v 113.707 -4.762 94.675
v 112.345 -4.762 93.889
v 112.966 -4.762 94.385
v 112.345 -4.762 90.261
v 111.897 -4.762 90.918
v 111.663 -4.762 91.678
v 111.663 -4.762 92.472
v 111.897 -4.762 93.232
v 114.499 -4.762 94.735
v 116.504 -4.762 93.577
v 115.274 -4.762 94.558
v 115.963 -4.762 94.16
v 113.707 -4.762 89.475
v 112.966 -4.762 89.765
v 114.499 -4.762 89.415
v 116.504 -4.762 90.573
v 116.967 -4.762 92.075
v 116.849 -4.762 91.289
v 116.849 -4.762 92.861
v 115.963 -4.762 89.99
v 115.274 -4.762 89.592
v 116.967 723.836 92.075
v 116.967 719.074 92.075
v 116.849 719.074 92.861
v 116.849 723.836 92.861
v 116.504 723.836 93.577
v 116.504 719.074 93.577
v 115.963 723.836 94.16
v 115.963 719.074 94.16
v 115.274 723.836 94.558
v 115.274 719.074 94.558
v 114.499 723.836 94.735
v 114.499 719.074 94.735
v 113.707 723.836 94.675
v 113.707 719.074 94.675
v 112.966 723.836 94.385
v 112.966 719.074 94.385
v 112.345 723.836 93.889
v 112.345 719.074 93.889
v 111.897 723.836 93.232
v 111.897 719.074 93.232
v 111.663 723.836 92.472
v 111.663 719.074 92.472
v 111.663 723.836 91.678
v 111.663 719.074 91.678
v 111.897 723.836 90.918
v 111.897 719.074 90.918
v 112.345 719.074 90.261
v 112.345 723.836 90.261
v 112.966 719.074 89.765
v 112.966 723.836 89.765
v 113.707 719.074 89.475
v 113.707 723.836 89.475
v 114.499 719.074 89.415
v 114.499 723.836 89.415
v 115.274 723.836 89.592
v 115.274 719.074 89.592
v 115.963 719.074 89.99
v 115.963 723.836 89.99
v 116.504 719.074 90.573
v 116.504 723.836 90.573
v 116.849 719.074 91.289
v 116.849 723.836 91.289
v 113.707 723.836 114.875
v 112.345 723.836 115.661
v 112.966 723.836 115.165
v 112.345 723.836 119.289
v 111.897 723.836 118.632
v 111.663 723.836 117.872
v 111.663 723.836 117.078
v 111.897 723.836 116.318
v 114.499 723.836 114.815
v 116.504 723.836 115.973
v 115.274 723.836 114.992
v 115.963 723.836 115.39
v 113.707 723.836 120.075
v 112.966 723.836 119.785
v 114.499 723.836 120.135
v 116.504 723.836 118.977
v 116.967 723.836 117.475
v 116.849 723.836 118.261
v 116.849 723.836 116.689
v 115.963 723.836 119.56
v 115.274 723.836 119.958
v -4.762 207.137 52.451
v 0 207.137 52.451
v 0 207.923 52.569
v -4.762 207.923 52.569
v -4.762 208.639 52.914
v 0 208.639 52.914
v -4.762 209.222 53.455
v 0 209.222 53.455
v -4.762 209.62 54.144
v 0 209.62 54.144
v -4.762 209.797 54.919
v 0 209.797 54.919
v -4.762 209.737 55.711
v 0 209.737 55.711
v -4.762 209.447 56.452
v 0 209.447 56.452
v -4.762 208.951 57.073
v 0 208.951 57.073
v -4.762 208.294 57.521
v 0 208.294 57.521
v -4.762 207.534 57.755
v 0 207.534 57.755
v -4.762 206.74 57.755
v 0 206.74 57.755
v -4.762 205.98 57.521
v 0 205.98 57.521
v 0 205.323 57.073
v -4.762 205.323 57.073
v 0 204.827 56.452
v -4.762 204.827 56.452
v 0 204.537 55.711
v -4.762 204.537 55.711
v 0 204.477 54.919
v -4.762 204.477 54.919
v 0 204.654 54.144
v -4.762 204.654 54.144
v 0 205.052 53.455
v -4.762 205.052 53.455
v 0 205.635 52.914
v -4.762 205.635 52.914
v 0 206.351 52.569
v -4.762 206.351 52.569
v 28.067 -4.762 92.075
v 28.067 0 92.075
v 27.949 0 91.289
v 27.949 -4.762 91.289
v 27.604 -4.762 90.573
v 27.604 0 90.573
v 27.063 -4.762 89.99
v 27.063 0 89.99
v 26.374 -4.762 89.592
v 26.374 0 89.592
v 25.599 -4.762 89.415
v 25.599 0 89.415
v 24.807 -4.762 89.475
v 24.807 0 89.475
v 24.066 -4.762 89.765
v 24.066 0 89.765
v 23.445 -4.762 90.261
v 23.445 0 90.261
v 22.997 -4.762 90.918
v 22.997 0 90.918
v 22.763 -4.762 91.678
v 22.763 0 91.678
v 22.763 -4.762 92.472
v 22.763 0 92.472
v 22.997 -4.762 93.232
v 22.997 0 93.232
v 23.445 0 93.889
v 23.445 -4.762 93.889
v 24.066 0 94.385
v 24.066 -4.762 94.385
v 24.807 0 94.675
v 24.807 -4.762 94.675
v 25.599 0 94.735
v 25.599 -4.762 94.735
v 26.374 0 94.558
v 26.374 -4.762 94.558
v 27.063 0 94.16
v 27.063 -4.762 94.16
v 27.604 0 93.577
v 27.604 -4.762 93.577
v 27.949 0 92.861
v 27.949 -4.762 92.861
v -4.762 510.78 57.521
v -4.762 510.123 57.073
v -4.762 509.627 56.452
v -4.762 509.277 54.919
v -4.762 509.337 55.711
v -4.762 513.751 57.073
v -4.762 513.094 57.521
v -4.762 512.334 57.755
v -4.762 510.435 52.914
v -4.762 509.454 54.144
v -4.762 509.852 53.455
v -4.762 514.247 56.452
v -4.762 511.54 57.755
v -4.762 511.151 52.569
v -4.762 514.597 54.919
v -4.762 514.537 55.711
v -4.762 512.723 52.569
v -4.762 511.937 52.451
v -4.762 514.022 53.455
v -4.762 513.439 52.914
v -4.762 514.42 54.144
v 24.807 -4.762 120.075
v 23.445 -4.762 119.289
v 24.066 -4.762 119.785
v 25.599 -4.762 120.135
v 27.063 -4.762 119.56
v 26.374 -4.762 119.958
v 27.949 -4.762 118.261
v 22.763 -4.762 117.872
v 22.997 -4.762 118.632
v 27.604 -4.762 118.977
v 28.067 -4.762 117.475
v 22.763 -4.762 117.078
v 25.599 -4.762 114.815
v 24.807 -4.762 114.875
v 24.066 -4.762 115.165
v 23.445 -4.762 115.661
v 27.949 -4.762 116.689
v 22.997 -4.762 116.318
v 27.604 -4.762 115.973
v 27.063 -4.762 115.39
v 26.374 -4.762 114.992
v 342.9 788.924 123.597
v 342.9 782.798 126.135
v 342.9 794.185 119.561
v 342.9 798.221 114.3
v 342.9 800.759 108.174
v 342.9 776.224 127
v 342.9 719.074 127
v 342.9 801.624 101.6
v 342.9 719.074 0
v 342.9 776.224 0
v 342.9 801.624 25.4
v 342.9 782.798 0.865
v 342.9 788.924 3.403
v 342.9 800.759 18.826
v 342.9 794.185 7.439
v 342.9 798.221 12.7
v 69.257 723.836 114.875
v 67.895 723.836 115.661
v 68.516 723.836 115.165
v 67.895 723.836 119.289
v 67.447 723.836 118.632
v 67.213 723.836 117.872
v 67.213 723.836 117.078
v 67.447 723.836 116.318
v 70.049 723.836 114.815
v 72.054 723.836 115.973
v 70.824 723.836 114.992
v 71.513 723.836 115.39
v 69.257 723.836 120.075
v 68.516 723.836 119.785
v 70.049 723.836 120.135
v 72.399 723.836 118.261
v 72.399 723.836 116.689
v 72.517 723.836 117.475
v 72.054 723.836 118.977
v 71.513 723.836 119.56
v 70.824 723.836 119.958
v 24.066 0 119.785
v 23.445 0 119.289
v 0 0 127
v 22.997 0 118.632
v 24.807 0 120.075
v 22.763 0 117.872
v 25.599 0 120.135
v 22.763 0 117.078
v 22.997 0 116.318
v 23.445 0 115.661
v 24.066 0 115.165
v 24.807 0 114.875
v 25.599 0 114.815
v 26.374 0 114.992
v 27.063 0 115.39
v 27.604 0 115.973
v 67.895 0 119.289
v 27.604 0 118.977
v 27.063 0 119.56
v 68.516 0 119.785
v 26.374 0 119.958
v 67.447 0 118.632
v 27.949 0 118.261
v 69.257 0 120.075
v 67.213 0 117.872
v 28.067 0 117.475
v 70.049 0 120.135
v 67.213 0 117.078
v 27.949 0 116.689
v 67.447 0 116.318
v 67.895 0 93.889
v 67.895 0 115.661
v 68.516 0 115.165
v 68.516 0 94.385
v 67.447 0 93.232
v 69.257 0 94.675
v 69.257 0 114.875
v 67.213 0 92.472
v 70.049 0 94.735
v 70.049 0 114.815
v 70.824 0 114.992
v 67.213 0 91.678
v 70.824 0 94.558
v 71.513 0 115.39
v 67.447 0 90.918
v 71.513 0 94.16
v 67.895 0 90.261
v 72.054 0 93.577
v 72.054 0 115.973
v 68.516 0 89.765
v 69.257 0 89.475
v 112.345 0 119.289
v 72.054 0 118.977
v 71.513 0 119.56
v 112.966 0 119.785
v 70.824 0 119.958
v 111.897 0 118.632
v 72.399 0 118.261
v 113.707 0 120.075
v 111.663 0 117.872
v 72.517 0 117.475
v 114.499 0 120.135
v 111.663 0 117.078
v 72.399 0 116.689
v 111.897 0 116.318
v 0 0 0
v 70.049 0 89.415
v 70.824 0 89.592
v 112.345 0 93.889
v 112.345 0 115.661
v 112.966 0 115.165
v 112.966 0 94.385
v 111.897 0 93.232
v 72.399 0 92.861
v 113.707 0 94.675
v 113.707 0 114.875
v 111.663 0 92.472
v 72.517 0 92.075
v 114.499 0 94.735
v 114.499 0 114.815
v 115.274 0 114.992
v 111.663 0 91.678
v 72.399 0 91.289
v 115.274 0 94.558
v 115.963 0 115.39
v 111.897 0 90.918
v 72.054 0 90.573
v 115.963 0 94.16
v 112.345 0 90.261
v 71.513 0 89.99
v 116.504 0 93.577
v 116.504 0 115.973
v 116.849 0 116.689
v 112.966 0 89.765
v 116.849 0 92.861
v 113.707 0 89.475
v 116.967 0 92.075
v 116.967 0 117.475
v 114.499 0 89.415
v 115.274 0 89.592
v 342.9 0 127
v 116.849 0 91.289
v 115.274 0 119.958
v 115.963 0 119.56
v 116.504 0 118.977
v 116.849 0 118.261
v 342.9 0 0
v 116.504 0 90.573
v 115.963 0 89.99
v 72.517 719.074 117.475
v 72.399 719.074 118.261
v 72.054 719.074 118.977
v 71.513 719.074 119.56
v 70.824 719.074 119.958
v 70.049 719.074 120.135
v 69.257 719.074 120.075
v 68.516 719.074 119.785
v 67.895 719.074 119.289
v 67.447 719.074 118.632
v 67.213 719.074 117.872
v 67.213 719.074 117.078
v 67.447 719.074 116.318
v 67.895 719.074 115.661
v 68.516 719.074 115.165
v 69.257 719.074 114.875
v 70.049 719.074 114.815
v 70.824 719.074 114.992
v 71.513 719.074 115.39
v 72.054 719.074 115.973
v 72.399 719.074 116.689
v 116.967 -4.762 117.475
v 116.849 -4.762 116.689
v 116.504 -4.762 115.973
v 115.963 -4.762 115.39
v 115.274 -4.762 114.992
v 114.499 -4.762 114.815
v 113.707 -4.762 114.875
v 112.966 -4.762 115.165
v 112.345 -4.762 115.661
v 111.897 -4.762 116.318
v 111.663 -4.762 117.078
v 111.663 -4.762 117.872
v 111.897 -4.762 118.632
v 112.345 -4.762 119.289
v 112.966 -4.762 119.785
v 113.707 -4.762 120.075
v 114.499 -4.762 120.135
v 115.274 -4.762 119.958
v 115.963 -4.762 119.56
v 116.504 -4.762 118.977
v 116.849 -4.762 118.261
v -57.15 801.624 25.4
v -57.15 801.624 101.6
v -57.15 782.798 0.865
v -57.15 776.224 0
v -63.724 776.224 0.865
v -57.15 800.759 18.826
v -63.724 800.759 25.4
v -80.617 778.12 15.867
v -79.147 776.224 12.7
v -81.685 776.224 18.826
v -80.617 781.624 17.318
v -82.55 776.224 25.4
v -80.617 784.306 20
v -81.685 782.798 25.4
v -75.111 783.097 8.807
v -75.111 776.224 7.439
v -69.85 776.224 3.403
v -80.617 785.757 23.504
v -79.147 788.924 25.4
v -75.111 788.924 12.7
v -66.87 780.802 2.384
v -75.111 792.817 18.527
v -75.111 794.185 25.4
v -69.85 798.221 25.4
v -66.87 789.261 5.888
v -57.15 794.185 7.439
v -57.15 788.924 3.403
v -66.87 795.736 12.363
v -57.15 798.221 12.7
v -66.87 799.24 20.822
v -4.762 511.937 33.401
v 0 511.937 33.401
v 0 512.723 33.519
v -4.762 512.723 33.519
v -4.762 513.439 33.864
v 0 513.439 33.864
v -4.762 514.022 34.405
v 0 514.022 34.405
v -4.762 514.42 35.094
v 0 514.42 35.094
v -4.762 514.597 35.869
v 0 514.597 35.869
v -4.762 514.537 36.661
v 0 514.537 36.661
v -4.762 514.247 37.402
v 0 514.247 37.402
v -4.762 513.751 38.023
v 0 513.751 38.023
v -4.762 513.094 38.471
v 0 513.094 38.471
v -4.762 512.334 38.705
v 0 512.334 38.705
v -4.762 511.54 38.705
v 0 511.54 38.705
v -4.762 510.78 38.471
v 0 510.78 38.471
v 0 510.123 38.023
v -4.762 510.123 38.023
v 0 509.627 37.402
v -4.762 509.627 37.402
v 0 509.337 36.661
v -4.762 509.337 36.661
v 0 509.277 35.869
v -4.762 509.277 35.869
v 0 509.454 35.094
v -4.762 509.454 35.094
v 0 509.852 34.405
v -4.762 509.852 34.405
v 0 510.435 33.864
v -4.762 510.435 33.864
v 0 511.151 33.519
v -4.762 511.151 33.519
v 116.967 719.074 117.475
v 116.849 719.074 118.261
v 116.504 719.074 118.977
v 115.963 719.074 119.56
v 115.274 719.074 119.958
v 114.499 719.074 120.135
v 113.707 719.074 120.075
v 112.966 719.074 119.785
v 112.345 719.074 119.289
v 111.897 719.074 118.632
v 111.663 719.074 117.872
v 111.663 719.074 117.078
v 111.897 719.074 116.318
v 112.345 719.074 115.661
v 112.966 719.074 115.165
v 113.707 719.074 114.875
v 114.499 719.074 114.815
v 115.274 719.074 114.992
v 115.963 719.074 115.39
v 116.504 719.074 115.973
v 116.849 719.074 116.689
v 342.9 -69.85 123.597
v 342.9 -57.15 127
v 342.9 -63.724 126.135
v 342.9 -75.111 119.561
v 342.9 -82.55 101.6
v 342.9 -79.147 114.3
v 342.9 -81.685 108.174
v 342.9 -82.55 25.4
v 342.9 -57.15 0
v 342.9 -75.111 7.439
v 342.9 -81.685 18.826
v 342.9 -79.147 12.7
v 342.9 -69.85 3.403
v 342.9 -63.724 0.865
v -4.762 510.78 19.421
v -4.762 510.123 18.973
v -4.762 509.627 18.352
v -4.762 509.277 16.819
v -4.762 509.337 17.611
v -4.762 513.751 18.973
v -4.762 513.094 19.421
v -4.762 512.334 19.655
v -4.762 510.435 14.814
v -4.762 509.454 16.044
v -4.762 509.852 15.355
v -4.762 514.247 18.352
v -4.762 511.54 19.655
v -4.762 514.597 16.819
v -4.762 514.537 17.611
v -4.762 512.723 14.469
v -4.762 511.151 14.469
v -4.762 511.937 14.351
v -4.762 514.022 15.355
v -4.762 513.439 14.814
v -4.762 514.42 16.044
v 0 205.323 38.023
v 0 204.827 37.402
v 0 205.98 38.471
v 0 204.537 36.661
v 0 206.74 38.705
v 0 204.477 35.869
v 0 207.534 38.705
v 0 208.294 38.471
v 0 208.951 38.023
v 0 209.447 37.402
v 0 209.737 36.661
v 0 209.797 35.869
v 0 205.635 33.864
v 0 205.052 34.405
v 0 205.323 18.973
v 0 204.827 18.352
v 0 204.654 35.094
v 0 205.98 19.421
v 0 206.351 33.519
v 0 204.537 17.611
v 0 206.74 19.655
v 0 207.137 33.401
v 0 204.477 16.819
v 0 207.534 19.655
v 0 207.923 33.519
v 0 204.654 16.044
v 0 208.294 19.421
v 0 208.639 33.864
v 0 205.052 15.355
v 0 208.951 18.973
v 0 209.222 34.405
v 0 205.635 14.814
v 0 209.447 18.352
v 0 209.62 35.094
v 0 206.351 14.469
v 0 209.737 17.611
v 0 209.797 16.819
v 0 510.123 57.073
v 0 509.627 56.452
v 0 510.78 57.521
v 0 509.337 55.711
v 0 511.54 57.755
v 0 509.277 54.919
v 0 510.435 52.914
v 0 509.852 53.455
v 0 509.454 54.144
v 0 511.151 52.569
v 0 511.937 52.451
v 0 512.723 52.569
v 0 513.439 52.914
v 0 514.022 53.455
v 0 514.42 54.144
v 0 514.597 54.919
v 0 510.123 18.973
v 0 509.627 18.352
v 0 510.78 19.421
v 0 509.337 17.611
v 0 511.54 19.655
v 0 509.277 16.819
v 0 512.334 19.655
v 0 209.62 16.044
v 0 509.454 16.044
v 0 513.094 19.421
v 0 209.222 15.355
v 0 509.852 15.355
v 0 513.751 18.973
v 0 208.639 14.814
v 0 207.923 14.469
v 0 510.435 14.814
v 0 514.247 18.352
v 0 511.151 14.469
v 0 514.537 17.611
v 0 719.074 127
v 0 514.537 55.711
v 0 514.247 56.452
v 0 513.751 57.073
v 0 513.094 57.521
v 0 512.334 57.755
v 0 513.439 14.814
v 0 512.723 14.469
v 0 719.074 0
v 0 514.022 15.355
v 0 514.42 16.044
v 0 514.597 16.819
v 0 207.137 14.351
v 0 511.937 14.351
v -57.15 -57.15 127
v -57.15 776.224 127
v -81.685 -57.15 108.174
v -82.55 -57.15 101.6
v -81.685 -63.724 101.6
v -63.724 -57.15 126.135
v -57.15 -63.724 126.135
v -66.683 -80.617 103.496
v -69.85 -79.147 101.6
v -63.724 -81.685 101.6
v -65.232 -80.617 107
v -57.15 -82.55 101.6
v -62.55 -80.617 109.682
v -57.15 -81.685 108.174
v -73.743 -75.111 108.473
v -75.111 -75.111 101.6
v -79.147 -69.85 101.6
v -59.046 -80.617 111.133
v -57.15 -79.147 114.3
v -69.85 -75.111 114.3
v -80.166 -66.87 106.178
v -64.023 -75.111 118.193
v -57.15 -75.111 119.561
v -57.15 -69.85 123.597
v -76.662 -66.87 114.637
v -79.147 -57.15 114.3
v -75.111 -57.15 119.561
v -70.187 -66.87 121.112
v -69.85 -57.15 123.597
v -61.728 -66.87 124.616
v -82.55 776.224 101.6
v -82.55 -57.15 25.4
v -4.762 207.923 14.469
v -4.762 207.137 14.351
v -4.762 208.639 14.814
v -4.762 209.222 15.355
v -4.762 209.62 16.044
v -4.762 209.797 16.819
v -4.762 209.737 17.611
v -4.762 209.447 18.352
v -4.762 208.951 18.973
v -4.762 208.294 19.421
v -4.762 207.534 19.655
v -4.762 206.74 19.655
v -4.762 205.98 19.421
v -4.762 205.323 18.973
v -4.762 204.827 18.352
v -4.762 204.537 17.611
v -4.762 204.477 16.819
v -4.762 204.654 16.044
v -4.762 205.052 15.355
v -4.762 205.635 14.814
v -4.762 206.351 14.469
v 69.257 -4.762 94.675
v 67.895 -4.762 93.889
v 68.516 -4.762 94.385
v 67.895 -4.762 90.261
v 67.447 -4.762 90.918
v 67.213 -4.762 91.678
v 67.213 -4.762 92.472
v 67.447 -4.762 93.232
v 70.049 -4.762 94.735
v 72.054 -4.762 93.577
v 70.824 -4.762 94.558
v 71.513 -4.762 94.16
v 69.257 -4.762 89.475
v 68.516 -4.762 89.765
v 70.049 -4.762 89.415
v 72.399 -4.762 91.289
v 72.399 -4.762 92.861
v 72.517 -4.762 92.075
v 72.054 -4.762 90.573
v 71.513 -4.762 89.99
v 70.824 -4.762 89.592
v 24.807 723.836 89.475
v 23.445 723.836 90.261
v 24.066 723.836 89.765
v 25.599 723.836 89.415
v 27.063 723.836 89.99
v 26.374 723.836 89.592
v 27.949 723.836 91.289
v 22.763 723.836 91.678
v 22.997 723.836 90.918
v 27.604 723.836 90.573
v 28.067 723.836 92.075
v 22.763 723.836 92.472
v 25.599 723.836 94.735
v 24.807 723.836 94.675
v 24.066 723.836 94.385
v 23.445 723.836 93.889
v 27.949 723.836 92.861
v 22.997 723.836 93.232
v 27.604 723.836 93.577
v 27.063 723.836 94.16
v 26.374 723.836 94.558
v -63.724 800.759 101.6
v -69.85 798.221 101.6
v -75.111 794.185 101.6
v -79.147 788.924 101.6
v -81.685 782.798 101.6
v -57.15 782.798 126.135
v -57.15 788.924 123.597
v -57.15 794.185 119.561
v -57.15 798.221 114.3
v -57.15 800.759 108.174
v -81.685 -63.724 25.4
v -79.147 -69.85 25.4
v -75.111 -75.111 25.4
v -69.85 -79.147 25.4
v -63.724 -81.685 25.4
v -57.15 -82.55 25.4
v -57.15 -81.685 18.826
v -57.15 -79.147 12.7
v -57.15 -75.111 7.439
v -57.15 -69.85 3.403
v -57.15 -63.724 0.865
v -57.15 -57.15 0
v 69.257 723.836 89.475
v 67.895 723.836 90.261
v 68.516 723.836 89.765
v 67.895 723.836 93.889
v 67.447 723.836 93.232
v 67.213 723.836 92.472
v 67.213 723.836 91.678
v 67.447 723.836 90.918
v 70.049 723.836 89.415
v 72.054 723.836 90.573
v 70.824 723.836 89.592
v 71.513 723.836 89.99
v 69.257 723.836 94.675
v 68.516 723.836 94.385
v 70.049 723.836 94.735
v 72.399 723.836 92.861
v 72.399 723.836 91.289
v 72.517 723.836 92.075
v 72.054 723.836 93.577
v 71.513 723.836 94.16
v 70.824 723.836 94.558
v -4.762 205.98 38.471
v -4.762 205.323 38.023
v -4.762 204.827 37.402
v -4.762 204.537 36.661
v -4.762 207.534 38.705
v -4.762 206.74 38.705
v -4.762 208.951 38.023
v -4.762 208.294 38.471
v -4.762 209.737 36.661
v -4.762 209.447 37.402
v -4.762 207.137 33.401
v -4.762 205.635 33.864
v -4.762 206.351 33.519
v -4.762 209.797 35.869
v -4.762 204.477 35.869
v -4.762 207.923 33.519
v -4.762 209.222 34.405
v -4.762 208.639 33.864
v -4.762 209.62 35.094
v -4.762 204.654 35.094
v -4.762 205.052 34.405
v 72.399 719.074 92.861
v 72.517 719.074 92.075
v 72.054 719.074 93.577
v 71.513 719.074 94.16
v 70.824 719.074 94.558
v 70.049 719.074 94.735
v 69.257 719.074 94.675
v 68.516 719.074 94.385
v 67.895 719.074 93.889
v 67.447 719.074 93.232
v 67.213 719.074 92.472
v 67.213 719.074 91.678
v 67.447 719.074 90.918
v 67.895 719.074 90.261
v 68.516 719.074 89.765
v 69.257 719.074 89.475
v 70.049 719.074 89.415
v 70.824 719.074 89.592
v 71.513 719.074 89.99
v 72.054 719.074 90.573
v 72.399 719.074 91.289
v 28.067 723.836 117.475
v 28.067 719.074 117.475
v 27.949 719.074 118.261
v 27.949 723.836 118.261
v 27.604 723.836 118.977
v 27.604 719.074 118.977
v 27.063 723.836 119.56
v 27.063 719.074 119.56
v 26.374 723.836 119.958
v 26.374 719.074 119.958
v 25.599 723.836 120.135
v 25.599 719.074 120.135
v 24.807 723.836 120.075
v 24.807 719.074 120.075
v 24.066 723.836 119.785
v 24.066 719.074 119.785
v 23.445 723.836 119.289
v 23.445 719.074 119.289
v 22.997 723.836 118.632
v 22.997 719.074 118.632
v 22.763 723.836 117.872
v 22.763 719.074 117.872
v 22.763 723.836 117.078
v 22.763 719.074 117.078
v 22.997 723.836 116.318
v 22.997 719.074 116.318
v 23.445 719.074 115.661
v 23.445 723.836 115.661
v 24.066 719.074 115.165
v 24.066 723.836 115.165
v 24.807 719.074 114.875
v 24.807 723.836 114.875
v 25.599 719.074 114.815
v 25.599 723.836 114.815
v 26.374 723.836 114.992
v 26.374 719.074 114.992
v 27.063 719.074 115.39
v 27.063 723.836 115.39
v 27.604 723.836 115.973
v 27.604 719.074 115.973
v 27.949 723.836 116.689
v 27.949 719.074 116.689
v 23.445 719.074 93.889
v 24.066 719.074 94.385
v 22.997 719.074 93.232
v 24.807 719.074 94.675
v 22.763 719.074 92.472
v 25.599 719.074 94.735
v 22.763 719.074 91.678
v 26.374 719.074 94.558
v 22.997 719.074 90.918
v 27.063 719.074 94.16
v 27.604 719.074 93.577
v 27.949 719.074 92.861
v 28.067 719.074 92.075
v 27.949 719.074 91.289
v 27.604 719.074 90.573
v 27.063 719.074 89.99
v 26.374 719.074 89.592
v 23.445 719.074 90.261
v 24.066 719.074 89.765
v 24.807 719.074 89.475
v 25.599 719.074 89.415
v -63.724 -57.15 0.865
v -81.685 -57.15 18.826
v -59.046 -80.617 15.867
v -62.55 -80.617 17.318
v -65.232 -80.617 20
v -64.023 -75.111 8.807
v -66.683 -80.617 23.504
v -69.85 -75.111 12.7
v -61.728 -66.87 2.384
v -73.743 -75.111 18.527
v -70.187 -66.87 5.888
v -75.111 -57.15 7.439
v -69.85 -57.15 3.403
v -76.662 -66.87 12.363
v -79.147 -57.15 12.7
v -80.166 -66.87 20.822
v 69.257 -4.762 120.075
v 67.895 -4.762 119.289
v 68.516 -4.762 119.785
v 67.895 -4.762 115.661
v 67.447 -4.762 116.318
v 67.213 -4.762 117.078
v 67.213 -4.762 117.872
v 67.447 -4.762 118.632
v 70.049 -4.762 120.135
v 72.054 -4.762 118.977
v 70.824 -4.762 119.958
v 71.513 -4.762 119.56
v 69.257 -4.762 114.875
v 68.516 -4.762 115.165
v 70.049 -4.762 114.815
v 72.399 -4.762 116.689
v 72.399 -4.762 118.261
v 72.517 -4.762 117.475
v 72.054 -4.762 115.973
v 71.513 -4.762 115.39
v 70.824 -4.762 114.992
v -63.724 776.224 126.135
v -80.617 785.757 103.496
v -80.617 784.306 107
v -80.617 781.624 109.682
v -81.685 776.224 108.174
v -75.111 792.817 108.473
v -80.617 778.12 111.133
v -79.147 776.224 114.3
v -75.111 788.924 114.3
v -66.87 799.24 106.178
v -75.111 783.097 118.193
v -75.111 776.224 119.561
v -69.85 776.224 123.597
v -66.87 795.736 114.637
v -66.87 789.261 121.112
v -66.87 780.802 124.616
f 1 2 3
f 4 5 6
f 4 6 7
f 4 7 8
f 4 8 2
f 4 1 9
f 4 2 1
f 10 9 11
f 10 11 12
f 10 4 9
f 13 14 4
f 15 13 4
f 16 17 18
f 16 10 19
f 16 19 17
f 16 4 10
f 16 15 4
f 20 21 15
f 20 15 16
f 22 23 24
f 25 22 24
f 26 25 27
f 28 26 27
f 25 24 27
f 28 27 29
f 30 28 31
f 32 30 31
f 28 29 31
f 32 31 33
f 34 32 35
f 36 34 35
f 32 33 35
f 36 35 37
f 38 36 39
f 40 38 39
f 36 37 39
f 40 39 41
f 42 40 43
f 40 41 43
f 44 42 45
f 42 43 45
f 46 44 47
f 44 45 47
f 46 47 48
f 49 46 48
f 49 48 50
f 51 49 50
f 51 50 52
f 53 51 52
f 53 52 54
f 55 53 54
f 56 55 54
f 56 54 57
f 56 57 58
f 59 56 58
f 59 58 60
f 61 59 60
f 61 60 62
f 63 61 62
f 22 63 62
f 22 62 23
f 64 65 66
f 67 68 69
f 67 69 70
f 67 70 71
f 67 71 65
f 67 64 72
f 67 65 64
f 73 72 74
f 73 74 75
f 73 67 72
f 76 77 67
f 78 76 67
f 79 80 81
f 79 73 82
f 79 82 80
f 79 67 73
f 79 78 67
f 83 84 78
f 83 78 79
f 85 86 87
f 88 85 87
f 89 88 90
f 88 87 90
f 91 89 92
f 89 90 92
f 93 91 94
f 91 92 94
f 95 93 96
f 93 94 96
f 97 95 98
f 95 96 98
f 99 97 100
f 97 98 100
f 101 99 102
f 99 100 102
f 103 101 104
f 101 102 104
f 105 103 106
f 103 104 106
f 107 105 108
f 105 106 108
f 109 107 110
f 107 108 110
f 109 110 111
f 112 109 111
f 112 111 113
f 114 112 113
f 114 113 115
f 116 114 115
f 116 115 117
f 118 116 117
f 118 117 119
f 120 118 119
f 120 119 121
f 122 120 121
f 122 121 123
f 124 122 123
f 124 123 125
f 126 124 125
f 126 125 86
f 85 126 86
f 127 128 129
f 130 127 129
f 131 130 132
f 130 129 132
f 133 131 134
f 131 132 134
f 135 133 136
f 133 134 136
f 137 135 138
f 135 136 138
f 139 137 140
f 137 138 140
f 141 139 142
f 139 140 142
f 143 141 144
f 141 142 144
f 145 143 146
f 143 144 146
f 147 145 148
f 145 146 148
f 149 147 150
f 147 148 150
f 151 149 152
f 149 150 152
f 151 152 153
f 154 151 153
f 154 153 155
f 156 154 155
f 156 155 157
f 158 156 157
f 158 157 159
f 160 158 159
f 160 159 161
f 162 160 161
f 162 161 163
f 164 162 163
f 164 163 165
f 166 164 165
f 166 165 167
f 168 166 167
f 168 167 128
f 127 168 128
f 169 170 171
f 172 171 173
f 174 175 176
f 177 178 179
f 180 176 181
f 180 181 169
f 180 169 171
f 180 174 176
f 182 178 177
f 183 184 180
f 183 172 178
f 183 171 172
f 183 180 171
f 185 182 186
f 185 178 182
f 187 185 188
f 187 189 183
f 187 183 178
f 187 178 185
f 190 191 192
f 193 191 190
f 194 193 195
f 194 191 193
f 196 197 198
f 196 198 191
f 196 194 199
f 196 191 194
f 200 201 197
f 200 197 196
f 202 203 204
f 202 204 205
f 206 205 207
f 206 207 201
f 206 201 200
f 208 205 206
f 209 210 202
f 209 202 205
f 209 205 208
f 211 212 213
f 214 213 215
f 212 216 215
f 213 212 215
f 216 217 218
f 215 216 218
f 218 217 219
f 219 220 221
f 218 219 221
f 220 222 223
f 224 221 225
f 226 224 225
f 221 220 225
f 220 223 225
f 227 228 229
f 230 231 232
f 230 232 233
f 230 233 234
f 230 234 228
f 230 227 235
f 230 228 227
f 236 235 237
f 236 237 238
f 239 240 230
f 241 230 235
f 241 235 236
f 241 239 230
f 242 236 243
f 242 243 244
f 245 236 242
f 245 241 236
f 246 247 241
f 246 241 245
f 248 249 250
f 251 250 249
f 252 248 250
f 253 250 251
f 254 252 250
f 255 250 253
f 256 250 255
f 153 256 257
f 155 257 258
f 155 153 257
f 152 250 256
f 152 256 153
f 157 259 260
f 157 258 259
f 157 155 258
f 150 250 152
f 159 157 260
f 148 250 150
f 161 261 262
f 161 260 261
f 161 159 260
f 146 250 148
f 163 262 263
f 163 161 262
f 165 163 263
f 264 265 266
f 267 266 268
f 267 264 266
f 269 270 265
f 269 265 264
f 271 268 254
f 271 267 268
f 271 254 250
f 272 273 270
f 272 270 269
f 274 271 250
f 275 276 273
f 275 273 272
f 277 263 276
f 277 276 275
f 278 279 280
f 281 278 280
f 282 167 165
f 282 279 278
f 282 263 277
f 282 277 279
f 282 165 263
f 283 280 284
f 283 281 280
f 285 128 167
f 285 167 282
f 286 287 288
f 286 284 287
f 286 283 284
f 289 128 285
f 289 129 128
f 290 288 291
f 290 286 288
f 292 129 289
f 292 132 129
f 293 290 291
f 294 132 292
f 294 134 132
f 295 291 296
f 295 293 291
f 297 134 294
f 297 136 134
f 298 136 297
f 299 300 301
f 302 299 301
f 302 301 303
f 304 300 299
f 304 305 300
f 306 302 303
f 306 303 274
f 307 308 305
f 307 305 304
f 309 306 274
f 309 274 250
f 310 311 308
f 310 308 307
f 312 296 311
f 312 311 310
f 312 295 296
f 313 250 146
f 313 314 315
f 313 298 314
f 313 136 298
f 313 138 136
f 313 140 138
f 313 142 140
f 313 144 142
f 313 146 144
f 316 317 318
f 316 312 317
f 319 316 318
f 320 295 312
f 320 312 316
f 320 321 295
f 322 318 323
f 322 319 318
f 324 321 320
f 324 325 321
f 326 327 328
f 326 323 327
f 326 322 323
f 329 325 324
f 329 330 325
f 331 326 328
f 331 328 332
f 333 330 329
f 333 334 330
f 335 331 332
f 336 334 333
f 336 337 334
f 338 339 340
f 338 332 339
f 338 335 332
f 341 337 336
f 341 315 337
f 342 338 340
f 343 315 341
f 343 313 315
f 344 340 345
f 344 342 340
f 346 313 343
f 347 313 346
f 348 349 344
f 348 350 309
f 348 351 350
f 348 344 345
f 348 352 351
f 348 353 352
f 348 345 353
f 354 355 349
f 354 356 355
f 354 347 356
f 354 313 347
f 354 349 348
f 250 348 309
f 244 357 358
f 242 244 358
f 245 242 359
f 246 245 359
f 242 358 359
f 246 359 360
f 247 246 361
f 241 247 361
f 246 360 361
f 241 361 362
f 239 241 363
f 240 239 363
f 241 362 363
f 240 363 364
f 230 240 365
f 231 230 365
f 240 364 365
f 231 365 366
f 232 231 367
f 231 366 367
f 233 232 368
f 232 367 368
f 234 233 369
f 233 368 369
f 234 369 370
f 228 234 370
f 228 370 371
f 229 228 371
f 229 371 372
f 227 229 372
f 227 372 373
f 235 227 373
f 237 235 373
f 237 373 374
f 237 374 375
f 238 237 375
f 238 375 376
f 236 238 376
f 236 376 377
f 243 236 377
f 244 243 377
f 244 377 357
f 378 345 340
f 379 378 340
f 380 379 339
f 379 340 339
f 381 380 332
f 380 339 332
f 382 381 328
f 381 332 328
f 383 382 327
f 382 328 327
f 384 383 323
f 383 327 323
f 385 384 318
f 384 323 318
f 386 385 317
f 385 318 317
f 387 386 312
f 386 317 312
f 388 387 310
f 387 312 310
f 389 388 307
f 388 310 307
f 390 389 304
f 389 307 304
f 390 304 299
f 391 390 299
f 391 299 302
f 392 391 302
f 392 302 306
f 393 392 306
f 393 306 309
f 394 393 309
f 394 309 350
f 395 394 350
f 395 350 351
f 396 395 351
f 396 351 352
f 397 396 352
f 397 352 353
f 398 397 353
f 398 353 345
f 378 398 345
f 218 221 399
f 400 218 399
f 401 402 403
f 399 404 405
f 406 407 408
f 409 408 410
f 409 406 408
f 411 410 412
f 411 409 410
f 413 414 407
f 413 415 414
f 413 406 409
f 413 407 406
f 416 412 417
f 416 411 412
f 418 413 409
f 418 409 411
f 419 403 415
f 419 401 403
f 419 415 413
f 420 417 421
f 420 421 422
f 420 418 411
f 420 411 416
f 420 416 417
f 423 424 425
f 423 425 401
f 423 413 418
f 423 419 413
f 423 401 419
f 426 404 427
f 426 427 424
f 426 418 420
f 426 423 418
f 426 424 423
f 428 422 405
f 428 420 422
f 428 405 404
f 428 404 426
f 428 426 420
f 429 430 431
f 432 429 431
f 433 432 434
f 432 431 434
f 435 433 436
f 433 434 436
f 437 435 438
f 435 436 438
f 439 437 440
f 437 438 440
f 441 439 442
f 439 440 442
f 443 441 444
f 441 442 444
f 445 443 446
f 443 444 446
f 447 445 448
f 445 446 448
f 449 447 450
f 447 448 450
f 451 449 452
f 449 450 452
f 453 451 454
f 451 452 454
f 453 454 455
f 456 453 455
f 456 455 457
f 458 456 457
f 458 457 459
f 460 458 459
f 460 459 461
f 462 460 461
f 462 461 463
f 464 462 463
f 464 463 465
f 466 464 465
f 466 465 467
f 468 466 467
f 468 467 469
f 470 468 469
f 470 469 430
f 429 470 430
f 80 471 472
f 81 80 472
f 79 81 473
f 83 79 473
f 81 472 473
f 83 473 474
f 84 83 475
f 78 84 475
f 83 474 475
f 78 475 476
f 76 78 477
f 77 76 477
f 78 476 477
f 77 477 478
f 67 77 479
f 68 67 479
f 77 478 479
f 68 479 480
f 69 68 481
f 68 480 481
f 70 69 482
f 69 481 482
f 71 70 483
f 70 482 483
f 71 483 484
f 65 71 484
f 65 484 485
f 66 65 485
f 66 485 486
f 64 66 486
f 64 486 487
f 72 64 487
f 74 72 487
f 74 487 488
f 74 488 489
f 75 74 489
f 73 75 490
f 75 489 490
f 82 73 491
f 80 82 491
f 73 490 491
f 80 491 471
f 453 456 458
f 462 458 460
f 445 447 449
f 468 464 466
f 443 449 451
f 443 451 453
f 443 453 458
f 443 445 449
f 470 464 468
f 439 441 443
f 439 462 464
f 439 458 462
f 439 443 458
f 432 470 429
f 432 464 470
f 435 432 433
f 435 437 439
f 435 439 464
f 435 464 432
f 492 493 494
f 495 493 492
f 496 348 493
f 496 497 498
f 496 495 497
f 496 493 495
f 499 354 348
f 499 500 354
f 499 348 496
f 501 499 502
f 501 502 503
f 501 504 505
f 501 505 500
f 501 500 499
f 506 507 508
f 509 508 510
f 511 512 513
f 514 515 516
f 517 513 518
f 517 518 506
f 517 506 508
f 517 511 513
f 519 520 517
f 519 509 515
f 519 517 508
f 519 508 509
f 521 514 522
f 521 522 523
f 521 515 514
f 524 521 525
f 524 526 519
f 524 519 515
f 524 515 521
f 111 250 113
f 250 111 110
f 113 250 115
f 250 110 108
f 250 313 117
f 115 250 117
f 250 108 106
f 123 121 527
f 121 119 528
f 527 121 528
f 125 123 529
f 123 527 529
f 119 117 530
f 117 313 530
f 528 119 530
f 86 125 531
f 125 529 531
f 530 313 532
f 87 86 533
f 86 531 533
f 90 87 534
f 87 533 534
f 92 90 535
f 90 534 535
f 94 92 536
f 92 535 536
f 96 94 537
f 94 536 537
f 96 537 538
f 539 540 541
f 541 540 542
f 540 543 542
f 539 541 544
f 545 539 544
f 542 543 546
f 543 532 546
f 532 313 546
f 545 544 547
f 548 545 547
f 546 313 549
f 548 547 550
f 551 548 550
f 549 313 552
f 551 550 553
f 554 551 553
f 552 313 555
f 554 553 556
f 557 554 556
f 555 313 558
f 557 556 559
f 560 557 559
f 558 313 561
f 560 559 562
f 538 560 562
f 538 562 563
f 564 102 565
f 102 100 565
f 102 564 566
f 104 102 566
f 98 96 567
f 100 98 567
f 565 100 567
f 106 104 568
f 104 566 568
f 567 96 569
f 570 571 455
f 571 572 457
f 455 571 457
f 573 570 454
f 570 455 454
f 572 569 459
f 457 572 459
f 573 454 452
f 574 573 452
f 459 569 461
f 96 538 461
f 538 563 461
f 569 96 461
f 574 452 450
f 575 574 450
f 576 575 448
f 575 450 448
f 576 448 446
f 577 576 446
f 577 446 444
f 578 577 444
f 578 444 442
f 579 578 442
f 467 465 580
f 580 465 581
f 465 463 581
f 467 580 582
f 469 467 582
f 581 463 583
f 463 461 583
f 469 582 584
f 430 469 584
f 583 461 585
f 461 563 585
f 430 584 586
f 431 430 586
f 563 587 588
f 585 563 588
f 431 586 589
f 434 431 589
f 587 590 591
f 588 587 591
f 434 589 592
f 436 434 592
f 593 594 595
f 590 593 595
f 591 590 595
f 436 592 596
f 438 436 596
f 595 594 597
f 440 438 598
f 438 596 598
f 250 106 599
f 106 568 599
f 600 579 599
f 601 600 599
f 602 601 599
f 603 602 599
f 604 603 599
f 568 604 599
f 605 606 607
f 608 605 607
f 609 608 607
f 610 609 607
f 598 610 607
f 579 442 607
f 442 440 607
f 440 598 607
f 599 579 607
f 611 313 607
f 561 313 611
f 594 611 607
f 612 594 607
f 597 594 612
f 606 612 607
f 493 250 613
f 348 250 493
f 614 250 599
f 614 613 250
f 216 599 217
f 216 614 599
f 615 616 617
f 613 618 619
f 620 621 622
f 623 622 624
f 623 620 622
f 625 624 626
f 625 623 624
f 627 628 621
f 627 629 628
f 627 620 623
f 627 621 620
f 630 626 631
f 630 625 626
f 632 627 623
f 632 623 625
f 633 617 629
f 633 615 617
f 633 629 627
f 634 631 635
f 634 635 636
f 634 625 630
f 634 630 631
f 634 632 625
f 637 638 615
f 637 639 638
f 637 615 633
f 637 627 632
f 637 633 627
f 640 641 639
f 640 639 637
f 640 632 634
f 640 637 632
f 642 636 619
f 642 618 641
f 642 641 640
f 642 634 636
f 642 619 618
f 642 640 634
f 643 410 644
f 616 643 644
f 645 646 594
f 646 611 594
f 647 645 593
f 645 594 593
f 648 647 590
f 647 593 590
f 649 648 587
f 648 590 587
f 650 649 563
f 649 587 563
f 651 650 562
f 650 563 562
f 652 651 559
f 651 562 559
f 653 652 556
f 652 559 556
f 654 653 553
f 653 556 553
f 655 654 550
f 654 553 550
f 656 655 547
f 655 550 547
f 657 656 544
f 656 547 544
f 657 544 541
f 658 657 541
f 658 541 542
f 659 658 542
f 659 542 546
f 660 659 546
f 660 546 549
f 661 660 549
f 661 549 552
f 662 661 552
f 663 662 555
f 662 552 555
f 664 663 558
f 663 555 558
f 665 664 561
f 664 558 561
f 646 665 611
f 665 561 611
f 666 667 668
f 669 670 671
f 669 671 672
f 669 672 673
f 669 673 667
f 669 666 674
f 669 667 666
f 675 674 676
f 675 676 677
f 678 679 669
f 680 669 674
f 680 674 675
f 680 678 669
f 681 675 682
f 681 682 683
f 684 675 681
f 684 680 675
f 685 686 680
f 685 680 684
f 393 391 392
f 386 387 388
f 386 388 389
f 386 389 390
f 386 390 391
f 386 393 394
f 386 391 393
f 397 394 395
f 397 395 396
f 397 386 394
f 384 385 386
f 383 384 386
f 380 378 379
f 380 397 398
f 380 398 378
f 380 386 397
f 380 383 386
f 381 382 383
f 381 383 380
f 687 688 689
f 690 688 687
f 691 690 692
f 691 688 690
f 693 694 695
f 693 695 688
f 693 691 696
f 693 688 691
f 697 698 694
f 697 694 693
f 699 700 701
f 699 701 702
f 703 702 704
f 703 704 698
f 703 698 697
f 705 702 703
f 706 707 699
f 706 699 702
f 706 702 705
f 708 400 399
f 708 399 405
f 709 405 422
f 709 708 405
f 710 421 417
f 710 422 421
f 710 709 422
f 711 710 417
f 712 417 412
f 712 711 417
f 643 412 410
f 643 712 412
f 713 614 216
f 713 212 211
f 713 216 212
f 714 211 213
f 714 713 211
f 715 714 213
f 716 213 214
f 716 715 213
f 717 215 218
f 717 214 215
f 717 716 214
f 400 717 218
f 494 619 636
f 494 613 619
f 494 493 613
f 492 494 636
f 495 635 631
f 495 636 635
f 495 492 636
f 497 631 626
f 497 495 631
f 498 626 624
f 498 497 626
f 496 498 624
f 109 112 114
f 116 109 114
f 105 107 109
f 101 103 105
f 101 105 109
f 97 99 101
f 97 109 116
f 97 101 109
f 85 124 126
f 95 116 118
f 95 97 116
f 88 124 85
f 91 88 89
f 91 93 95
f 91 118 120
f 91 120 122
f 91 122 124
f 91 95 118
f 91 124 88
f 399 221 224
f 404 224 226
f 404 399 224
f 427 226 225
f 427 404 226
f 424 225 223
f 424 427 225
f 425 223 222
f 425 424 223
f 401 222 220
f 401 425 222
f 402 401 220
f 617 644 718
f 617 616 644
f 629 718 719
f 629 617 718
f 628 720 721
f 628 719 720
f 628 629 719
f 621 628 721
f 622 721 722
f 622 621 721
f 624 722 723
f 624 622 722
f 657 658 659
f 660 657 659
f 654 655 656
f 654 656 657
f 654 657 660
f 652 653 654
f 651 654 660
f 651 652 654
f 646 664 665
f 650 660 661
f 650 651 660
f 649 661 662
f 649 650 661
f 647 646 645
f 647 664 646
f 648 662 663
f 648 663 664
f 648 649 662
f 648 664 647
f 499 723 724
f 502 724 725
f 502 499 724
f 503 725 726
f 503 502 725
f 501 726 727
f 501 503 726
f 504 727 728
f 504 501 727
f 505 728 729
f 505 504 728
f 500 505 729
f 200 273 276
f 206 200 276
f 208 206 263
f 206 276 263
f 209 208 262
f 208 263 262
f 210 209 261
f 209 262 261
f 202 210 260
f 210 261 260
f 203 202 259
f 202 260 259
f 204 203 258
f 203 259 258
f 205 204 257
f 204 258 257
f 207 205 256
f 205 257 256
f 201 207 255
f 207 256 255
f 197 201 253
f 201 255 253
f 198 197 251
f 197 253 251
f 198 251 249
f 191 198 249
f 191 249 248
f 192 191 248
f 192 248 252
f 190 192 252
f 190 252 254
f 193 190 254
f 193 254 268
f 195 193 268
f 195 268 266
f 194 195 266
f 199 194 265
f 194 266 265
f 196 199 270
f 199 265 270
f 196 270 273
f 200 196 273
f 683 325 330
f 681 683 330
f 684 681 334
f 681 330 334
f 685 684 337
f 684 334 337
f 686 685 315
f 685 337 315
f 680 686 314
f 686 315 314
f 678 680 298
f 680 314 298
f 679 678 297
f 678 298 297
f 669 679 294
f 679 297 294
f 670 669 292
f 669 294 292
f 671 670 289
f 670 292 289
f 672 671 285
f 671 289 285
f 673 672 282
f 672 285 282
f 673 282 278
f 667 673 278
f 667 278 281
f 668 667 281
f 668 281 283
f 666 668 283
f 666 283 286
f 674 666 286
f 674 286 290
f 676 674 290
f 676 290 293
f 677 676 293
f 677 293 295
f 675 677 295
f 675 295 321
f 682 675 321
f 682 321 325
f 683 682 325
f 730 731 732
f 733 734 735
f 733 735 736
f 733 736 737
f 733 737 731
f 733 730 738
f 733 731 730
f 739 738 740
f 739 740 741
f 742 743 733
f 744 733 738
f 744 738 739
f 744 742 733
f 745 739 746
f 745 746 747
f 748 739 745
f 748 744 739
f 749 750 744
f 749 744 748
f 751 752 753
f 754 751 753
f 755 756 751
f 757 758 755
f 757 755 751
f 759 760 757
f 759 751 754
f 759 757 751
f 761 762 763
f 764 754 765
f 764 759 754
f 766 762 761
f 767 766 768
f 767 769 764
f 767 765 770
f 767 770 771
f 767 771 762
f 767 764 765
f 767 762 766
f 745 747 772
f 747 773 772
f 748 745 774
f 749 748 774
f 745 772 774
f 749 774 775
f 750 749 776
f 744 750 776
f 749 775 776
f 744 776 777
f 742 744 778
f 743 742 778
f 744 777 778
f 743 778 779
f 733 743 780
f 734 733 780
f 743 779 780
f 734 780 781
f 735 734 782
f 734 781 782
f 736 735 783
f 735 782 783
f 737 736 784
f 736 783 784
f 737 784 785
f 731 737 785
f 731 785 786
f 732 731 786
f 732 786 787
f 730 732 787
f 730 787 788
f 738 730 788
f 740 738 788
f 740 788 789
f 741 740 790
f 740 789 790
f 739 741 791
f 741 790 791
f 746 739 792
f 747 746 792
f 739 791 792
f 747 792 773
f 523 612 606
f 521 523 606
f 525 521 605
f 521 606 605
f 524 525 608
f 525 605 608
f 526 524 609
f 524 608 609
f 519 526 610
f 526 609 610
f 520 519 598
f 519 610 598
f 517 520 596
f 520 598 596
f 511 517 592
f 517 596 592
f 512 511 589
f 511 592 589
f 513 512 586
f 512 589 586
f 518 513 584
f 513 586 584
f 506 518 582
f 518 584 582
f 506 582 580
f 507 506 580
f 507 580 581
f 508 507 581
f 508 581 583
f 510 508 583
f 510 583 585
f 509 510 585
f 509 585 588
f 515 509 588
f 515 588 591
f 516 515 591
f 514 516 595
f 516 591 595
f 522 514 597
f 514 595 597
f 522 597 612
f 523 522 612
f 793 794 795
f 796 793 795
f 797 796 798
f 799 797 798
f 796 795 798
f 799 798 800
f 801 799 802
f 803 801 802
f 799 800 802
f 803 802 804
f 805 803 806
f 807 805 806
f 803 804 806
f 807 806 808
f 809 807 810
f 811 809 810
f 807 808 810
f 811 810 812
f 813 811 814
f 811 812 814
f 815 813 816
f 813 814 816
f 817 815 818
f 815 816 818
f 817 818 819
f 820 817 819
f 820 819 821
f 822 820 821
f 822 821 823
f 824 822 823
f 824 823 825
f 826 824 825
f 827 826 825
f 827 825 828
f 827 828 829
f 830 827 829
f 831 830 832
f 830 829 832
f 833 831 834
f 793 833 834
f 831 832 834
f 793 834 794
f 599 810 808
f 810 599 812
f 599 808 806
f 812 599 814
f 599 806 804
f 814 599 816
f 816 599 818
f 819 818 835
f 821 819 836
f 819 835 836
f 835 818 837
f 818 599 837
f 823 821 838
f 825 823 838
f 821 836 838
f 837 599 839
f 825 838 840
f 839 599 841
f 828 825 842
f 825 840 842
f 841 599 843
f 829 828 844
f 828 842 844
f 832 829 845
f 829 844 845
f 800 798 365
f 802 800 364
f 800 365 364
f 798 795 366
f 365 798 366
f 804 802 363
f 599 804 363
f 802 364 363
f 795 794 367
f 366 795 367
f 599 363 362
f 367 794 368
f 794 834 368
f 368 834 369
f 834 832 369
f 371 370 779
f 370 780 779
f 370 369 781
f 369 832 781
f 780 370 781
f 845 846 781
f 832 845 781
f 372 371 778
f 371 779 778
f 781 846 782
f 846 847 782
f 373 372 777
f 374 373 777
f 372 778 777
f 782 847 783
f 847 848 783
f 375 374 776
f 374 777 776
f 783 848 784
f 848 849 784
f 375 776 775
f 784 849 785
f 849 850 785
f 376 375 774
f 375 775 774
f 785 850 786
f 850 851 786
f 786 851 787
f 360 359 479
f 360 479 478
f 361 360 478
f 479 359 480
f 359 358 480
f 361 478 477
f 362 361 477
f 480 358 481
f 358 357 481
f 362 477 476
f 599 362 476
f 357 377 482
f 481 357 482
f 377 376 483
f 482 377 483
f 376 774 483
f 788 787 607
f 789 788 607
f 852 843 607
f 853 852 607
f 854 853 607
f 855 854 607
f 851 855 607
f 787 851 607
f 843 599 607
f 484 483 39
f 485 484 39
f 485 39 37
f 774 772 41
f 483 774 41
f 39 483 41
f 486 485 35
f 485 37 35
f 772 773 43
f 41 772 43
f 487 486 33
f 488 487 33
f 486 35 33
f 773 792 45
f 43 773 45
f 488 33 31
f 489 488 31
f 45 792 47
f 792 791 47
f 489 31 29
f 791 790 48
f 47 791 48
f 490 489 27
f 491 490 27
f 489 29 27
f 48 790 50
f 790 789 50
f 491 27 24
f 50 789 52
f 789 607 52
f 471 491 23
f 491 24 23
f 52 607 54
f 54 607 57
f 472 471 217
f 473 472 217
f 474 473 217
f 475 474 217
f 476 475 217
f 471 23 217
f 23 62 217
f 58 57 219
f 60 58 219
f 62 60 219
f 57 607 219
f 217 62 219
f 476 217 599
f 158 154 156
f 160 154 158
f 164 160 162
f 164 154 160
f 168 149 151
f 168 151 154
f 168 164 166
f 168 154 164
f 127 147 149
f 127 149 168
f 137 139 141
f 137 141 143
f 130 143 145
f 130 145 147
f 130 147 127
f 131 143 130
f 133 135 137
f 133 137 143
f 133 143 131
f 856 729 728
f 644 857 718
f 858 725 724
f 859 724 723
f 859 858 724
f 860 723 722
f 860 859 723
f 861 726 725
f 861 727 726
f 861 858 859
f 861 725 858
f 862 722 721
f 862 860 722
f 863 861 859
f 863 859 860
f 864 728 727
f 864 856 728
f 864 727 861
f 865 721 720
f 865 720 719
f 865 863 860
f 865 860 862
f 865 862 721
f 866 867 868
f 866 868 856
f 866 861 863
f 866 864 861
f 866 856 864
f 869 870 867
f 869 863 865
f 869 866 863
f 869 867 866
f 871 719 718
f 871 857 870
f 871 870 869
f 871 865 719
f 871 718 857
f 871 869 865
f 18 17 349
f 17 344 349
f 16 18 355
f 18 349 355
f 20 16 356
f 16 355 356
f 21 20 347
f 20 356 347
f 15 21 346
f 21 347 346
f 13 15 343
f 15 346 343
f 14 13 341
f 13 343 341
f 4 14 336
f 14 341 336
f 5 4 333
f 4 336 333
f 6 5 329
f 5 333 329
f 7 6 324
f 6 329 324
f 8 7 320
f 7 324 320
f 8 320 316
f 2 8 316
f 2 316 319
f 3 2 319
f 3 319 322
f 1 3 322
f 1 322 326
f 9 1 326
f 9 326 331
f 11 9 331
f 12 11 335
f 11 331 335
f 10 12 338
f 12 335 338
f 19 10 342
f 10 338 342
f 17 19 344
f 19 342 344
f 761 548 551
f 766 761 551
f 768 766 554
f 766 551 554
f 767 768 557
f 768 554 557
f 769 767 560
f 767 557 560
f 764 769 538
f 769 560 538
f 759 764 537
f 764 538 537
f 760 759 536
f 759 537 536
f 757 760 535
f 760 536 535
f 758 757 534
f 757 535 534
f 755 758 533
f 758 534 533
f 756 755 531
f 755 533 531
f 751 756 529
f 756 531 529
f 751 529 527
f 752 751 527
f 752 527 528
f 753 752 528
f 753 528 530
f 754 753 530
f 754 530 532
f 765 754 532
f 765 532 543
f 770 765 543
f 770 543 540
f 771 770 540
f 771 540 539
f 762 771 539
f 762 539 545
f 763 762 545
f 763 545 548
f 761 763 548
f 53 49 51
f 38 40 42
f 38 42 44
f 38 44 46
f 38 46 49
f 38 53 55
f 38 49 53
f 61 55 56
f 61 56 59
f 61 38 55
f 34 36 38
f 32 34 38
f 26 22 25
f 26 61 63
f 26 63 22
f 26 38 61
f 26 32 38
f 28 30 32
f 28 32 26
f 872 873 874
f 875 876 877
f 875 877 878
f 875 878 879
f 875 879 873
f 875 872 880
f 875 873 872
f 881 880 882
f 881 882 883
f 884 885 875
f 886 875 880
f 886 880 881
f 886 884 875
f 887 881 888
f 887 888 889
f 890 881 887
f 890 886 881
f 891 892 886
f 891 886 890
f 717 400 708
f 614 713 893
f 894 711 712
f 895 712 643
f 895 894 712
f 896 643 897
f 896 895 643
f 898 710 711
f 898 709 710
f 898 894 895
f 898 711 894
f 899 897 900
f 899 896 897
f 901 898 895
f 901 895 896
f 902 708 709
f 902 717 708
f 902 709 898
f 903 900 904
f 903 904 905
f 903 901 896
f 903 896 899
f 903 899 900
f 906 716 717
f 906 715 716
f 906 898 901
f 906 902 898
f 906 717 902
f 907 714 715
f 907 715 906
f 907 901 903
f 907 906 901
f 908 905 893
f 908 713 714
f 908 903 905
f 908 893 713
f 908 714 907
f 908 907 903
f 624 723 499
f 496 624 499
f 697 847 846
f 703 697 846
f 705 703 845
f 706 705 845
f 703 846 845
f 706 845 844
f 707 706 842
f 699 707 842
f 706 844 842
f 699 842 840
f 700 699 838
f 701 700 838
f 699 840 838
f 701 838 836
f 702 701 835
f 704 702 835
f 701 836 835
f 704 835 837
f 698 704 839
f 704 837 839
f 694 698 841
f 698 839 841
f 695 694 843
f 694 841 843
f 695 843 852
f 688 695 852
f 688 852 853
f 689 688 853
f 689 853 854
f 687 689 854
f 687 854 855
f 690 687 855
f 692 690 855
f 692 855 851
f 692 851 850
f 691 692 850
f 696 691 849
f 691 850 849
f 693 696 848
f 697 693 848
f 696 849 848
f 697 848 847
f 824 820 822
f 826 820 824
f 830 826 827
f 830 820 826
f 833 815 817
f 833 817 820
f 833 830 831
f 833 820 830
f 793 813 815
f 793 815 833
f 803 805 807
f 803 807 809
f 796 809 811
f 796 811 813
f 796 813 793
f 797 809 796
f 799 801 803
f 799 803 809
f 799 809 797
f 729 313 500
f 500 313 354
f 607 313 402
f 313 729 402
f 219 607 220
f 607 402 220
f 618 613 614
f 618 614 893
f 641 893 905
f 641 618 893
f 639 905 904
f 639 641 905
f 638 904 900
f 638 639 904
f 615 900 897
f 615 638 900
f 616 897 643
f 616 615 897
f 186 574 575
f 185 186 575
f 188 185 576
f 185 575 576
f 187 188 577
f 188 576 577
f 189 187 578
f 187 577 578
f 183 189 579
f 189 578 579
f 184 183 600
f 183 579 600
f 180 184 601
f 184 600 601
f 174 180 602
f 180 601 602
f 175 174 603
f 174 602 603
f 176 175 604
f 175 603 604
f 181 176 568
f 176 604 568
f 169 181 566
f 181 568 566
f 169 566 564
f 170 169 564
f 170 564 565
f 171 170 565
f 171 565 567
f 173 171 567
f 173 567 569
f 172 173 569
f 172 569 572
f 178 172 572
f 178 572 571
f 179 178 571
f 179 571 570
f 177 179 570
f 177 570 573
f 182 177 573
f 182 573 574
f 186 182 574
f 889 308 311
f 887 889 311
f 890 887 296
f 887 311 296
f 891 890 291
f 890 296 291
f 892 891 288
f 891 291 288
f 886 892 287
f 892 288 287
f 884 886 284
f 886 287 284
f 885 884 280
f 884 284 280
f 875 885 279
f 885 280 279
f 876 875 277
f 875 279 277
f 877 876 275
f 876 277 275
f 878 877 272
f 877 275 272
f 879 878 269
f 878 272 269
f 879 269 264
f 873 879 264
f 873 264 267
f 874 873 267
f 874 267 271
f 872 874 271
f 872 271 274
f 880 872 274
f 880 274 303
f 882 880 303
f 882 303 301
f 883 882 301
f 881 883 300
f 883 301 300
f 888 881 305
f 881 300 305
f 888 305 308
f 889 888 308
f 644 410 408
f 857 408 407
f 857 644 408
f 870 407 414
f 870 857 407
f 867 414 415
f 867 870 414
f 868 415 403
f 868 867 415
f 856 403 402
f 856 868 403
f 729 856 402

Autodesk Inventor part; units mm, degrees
ref_plane "YZ Plane" through (0, 0, 0) normal (1, 0, 0) x (0, 1, 0)
ref_plane "XZ Plane" through (0, 0, 0) normal (0, 1, 0) x (-1, 0, 0)
ref_plane "XY Plane" through (0, 0, 0) normal (0, 0, 1) x (1, 0, 0)
sketch "Sketch1" plane through (0, 0, 0) normal (0, 0, 1) x (1, 0, 0)
  line L0 (0, 0) -> (0, 719.074)
  line L1 (0, 719.074) -> (342.9, 719.074)
  line L2 (0, 0) -> (342.9, 0)
  line L3 (342.9, 801.624) -> (-82.55, 801.624)
  line L4 (-82.55, 801.624) -> (-82.55, -82.55)
  line L5 (-82.55, -82.55) -> (342.9, -82.55)
  line L6 (342.9, 719.074) -> (342.9, 801.624)
  line L7 (342.9, 0) -> (342.9, -82.55)
  dimension "d0" = 719.074
  dimension "d1" = 342.9
  dimension "d2" = 82.55
extrude "Extrusion1" add sketch "Sketch1" along normal blind 127
fillet "Fillet1" radius 25.4 8 edges at (130.175, 801.624, 127) (130.175, 801.624, 0) (-82.55, 801.624, 63.5) (-82.55, 359.537, 127) (-82.55, 359.537, 0) (-82.55, -82.55, 63.5) (130.175, -82.55, 0) (130.175, -82.55, 127)
sketch "Sketch2" plane through (0, 719.074, 0) normal (0, -1, 0) x (1, 0, 0)
  line L0 (342.9, 0) -> (342.9, 127) construction
  line L1 (0, 127) -> (342.9, 127) construction
  line L2 (342.9, 127) -> (114.3, 127) construction
  line L3 (114.3, 127) -> (69.85, 127) construction
  line L4 (69.85, 127) -> (25.4, 127) construction
  line L5 (114.3, 127) -> (114.3, 117.475) construction
  line L6 (114.3, 117.475) -> (69.85, 117.475) construction
  line L7 (69.85, 117.475) -> (25.4, 117.475) construction
  line L8 (25.4, 117.475) -> (25.4, 92.075) construction
  line L9 (25.4, 92.075) -> (69.85, 92.075) construction
  line L10 (69.85, 92.075) -> (114.3, 92.075) construction
  circle A0 centre (114.3, 117.475) radius 2.667
  circle A1 centre (69.85, 117.475) radius 2.667
  circle A2 centre (25.4, 117.475) radius 2.667
  circle A3 centre (25.4, 92.075) radius 2.667
  circle A4 centre (69.85, 92.075) radius 2.667
  circle A5 centre (114.3, 92.075) radius 2.667
  point P0 (0, 0)
  dimension "d7" = 228.6
  dimension "d8" = 44.45
  dimension "d9" = 44.45
  dimension "d10" = 9.525
  dimension "d11" = 25.4
  dimension "d12" = 5.334
extrude "Extrusion2" cut sketch "Sketch2" against normal blind 4.7625
sketch "Sketch3" plane through (0, 0, 0) normal (0, 1, 0) x (1, 0, 0)
  line L0 (342.9, -127) -> (0, -127) construction
  line L1 (342.9, -127) -> (342.9, -117.475) construction
  line L2 (342.9, 0) -> (342.9, -127) construction
  line L3 (342.9, -117.475) -> (114.3, -117.475) construction
  line L4 (114.3, -117.475) -> (69.85, -117.475) construction
  line L5 (69.85, -117.475) -> (25.4, -117.475) construction
  line L6 (25.4, -117.475) -> (25.4, -92.075) construction
  line L7 (25.4, -92.075) -> (69.85, -92.075) construction
  line L8 (69.85, -92.075) -> (114.3, -92.075) construction
  circle A0 centre (114.3, -117.475) radius 2.667
  circle A1 centre (69.85, -117.475) radius 2.667
  circle A2 centre (25.4, -117.475) radius 2.667
  circle A3 centre (25.4, -92.075) radius 2.667
  circle A4 centre (69.85, -92.075) radius 2.667
  circle A5 centre (114.3, -92.075) radius 2.667
  point P0 (0, 0)
  dimension "d15" = 9.525
  dimension "d16" = 228.6
  dimension "d17" = 44.45
  dimension "d18" = 44.45
  dimension "d19" = 25.4
  dimension "d20" = 5.334
extrude "Extrusion3" cut sketch "Sketch3" against normal blind 4.7625
sketch "Sketch4" plane through (0, 0, 0) normal (1, 0, 0) x (0, 0, -1)
  line L0 (-127, -57.15) -> (-127, 0) construction
  line L1 (-127, 0) -> (-127, 207.137) construction
  line L2 (-127, 0) -> (-127, 719.074) construction
  line L3 (-127, 207.137) -> (-55.118, 207.137) construction
  line L4 (-55.118, 207.137) -> (-36.068, 207.137) construction
  line L5 (-36.068, 207.137) -> (-17.018, 207.137) construction
  circle A0 centre (-55.118, 207.137) radius 2.667
  circle A1 centre (-36.068, 207.137) radius 2.667
  circle A2 centre (-17.018, 207.137) radius 2.667
  line L6 (-127, 359.537) -> (0, 359.537) construction
  line L7 (0, 0) -> (0, 719.074) construction
  line L8 (-55.118, 511.937) -> (-36.068, 511.937) construction
  line L9 (-36.068, 511.937) -> (-17.018, 511.937) construction
  circle A3 centre (-55.118, 511.937) radius 2.667
  circle A4 centre (-36.068, 511.937) radius 2.667
  circle A5 centre (-17.018, 511.937) radius 2.667
  dimension "d23" = 207.137
  dimension "d24" = 71.882
  dimension "d25" = 19.05
  dimension "d26" = 19.05
  dimension "d27" = 5.334
extrude "Extrusion4" cut sketch "Sketch4" against normal blind 4.7625
properties part number "Bumper Side"
